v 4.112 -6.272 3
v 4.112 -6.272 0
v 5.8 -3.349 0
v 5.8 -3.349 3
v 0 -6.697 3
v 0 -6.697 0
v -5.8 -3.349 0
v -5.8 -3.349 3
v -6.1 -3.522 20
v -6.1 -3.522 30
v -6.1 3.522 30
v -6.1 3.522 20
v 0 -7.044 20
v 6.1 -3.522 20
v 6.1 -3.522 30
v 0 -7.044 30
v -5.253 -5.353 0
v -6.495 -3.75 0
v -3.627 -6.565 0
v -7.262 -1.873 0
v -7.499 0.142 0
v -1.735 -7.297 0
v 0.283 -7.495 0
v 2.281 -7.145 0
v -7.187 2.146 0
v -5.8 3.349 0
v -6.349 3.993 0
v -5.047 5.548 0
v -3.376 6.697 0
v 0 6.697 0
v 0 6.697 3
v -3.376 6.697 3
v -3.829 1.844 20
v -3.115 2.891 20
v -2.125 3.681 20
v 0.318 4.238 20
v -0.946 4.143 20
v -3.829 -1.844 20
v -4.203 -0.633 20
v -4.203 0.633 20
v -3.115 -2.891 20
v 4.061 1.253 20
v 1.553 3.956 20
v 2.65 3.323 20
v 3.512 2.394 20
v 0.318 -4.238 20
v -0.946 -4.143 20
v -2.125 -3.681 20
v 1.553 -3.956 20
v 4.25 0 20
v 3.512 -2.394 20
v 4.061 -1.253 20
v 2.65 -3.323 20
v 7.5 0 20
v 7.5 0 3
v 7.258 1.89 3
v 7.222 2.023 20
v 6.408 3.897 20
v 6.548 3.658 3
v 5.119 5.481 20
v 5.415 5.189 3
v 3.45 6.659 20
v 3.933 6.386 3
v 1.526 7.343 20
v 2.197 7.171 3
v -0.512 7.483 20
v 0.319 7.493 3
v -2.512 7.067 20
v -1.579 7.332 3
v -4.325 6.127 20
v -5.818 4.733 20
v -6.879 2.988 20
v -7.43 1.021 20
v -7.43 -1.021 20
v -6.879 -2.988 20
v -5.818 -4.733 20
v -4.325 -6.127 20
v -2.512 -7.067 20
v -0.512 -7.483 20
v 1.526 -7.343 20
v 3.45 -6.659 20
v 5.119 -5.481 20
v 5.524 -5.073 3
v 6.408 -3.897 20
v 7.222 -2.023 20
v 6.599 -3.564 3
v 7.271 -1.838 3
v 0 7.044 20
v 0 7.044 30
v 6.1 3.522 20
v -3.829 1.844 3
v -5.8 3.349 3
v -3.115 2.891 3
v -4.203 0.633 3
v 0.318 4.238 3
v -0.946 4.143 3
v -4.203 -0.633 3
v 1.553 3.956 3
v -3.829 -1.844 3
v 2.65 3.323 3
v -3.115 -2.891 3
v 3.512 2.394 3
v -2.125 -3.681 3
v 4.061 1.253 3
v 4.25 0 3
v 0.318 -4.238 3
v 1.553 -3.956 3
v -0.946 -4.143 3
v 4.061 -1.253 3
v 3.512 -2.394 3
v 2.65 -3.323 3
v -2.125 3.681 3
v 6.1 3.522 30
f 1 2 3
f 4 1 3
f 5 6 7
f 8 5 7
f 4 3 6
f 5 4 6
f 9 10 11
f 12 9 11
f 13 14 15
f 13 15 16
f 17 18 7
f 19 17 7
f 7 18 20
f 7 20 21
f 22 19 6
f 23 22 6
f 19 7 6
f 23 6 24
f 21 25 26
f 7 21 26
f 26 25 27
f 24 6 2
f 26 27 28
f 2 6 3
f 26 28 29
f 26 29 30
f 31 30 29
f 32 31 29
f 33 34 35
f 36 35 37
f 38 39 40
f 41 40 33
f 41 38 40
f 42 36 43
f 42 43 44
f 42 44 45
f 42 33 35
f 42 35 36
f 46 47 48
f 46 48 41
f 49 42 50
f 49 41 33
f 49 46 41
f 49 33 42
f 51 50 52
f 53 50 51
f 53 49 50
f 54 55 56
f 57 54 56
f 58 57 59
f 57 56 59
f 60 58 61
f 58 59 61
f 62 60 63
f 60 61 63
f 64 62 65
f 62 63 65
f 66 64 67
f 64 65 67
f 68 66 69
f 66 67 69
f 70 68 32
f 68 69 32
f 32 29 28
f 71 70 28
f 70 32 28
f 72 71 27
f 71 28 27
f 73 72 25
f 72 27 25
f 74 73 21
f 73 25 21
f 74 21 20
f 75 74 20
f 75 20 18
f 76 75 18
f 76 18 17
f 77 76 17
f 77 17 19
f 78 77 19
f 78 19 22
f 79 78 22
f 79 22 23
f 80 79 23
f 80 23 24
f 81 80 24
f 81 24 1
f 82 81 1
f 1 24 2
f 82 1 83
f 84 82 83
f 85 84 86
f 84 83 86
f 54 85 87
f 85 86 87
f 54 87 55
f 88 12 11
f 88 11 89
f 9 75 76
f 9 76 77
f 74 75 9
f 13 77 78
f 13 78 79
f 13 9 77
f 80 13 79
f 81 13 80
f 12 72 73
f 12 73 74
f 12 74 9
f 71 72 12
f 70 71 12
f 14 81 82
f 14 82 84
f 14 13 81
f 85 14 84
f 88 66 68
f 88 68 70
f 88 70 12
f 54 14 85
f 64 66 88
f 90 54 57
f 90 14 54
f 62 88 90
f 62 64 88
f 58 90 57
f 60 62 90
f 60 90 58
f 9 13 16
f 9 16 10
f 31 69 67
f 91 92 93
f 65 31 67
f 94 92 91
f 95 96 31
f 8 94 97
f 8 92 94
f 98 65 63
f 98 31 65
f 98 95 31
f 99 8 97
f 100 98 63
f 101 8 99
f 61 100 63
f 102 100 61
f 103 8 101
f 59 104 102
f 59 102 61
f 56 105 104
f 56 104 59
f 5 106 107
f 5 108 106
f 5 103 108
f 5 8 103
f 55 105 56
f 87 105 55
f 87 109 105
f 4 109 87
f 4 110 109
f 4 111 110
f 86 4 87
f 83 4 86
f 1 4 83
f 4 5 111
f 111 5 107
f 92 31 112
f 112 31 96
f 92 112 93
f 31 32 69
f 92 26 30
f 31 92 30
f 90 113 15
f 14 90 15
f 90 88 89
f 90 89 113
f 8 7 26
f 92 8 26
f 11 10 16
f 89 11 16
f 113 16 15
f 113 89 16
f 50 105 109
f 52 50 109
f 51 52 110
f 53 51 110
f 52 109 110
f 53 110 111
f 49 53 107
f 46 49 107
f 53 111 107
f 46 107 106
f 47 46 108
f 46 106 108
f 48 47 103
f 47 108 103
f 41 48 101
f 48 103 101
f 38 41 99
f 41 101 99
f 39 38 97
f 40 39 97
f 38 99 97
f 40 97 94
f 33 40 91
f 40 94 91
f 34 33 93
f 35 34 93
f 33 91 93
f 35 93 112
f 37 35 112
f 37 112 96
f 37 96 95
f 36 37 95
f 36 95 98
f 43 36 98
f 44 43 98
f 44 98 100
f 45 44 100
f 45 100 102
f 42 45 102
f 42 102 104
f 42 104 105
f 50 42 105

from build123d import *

# Parameters (mm, degrees)
F0_R      = 7.5
F1_DEPTH  = 30
F2_R      = 4.25
F3_DEPTH  = 20
F4_R      = 4.25
F5_DEPTH  = 3
F7_R      = 7.5
F8_DEPTH  = 10
F10_DEPTH = 3


# Not quite as in the source:
# - a feature names something its author has since deleted; it is built from what else it names


with BuildPart() as f1:
    # F0 (on Top) → F1 (new body)
    with BuildSketch(Plane.XY):
        Circle(F0_R)
    extrude(amount=F1_DEPTH)

    # F2 (on face) → F3 (cut)
    with BuildSketch(Plane(origin=(0, 0, 0), x_dir=(1, 0, 0), z_dir=(0, 0, -1))):
        Circle(F2_R)
    extrude(amount=-F3_DEPTH, mode=Mode.SUBTRACT)

    # F4 (on face) → F5 (cut)
    with BuildSketch(Plane(origin=(0, 0, 0), x_dir=(1, 0, 0), z_dir=(0, 0, -1))):
        Polygon((5.8, -3.3486315613), (5.8, 3.3486315613), (0, 6.6972631226), (-5.8, 3.3486315613), (-5.8, -3.3486315613), (0, -6.6972631226), align=None)
        Circle(F4_R, mode=Mode.SUBTRACT)
    extrude(amount=-F5_DEPTH, mode=Mode.SUBTRACT)

    # F7 (on face) → F8 (cut)
    with BuildSketch(Plane.XY.offset(30)):
        Circle(F7_R)
        Polygon((0, 7.0436732841), (6.1, 3.5218366421), (6.1, -3.5218366421), (0, -7.0436732841), (-6.1, -3.5218366421), (-6.1, 3.5218366421), align=None, mode=Mode.SUBTRACT)
    extrude(amount=-F8_DEPTH, mode=Mode.SUBTRACT)

    # F9 (on face) → F10 (cut, through all)
    with BuildSketch(Plane(origin=(0, 0, 0), x_dir=(1, 0, 0), z_dir=(0, 0, -1))):
        with BuildLine():
            Line((4.1120525285, 6.2722423425), (5.8, 3.3486315613))
            Line((5.8, 3.3486315613), (5.8, -3.3486315613))
            Line((5.8, -3.3486315613), (0, -6.6972631226))
            Line((0, -6.6972631226), (-3.3758949431, -6.6972631226))
            ThreePointArc((-3.3758949431, -6.6972631226), (3.9326065101, -6.3862826462), (7.5, 0))
            ThreePointArc((7.5, 0), (6.5988784639, 3.5643797523), (4.1120525285, 6.2722423425))
        make_face()
    extrude(amount=-F10_DEPTH, mode=Mode.SUBTRACT)


solid = f1.part
